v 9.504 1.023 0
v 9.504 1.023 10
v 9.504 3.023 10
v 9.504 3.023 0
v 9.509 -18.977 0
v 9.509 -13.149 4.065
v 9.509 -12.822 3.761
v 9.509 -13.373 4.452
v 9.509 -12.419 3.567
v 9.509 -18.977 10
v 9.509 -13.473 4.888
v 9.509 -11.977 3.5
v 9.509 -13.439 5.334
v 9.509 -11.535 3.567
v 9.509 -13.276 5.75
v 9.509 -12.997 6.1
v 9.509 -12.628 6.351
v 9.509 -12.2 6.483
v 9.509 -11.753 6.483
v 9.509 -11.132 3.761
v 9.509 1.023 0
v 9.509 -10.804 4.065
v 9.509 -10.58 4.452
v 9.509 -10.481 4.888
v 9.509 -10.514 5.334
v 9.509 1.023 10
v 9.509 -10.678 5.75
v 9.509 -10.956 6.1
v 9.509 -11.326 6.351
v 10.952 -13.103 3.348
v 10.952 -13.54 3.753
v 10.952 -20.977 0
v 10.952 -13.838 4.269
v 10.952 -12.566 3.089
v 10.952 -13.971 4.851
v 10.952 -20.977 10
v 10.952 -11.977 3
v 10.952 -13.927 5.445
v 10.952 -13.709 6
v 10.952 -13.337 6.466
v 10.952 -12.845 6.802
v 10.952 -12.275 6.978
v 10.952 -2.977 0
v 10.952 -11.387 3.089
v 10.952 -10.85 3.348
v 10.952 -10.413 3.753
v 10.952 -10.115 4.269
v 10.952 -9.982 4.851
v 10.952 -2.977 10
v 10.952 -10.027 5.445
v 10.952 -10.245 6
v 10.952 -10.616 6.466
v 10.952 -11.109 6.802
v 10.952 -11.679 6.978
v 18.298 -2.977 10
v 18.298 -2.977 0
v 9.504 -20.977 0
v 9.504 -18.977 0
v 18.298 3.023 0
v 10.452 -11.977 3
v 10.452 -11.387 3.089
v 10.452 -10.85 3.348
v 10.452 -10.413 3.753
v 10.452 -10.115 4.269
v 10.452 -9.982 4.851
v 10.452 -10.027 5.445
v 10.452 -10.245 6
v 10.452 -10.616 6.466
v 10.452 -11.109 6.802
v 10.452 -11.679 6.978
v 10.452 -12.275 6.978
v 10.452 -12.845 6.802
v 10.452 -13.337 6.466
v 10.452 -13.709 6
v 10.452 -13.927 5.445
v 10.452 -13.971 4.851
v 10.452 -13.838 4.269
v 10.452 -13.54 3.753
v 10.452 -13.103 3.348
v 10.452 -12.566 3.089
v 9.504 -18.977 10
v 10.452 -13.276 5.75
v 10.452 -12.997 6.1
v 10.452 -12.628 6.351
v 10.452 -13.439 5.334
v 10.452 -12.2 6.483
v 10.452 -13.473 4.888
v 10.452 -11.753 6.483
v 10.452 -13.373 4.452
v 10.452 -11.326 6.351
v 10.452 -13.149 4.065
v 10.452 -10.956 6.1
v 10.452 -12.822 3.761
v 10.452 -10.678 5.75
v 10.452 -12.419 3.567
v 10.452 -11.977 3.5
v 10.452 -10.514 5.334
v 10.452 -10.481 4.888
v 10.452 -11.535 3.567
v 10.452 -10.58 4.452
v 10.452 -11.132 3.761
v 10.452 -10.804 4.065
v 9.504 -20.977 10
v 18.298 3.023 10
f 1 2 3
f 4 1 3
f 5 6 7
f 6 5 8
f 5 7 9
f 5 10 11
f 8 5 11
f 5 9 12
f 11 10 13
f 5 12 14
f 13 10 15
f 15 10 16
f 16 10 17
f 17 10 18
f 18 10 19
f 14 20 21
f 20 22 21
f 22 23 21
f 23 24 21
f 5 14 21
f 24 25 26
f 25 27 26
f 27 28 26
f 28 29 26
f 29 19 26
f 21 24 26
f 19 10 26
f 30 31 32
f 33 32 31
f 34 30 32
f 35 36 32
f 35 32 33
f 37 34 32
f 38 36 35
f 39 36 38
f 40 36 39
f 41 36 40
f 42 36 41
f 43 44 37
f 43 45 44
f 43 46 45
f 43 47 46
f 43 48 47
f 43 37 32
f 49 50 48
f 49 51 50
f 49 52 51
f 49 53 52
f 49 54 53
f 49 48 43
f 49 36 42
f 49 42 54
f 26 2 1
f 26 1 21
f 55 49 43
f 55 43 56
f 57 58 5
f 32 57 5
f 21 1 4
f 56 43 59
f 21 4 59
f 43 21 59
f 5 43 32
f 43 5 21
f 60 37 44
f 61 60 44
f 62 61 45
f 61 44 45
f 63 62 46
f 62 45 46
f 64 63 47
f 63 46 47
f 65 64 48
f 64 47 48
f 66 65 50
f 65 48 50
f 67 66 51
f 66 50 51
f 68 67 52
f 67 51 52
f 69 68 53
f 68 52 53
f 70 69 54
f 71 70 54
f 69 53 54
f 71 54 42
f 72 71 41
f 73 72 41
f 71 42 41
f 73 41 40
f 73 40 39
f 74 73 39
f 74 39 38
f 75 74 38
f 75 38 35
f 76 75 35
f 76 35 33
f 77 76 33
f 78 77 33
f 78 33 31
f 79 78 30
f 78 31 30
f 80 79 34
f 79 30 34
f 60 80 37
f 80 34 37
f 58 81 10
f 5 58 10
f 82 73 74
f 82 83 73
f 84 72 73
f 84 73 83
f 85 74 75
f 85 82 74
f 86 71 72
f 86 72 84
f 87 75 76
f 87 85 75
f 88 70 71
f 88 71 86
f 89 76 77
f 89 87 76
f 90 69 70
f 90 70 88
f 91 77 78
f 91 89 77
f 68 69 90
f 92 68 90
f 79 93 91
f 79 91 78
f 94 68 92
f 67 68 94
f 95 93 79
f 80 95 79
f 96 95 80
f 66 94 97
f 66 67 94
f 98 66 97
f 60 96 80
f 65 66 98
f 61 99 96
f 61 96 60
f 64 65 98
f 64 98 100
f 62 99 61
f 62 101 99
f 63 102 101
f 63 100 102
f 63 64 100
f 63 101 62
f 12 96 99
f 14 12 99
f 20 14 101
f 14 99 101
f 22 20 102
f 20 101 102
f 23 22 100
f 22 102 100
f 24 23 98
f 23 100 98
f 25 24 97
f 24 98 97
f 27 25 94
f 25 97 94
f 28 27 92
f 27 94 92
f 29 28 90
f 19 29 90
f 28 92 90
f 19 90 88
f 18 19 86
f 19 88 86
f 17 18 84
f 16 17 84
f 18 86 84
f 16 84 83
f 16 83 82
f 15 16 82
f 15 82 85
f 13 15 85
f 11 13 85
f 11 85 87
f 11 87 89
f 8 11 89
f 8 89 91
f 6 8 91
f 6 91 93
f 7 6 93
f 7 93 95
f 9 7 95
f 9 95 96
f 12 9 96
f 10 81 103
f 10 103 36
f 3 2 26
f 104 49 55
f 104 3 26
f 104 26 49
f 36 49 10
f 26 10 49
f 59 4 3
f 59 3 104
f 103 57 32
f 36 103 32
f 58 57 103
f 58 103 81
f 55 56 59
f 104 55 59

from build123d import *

# Parameters (mm, degrees)
ESQUISSE1_W             = 30
ESQUISSE1_H             = 24
BOSS_EXTRU_1_DEPTH      = 10
ESQUISSE2_W             = 20
ESQUISSE2_H             = 20
ENL_V_MAT_EXTRU_1_DEPTH = 10
ESQUISSE3_W             = 7.346397708
ESQUISSE3_H             = 18
ENL_V_MAT_EXTRU_2_DEPTH = 10
ESQUISSE5_W             = 21.205400457
ESQUISSE5_H             = 24
ENL_V_MAT_EXTRU_3_DEPTH = 10
ESQUISSE6_R             = 2
ENL_V_MAT_EXTRU_4_DEPTH = 0.5
ESQUISSE7_R             = 1.5
ENL_V_MAT_EXTRU_5_DEPTH = 10.5


with BuildPart() as part:
    # Esquisse1 → Boss.-Extru.1 (new body)
    with BuildSketch(Plane.XY):
        with Locations((3.298240101, -8.976744186)):
            Rectangle(ESQUISSE1_W, ESQUISSE1_H)
    extrude(amount=BOSS_EXTRU_1_DEPTH)

    # Esquisse2 → Enlèv. mat.-Extru.1 (cut)
    with BuildSketch(Plane.XY.offset(10)):
        with Locations((-0.490787108, -8.976744186)):
            Rectangle(ESQUISSE2_W, ESQUISSE2_H)
    extrude(amount=-ENL_V_MAT_EXTRU_1_DEPTH, mode=Mode.SUBTRACT)

    # Esquisse3 → Enlèv. mat.-Extru.2 (cut)
    with BuildSketch(Plane.XY.offset(10)):
        with Locations((14.625041247, -11.976744186)):
            Rectangle(ESQUISSE3_W, ESQUISSE3_H)
    extrude(amount=-ENL_V_MAT_EXTRU_2_DEPTH, mode=Mode.SUBTRACT)

    # Esquisse5 → Enlèv. mat.-Extru.3 (cut)
    with BuildSketch(Plane.XY.offset(10)):
        with Locations((-1.09905967, -8.976744186)):
            Rectangle(ESQUISSE5_W, ESQUISSE5_H)
    extrude(amount=-ENL_V_MAT_EXTRU_3_DEPTH, mode=Mode.SUBTRACT)

    # Esquisse6 → Enlèv. mat.-Extru.4 (cut)
    with BuildSketch(Plane(origin=(10.951842393, 0, 0), x_dir=(0, 0, -1), z_dir=(1, 0, 0))):
        with Locations((-5, -11.976744186)):
            Circle(ESQUISSE6_R)
    extrude(amount=-ENL_V_MAT_EXTRU_4_DEPTH, mode=Mode.SUBTRACT)

    # Esquisse7 → Enlèv. mat.-Extru.5 (cut)
    with BuildSketch(Plane(origin=(10.451842393, 0, 0), x_dir=(0, 0, -1), z_dir=(1, 0, 0))):
        with Locations((-5, -11.976744186)):
            Circle(ESQUISSE7_R)
    extrude(amount=-ENL_V_MAT_EXTRU_5_DEPTH, mode=Mode.SUBTRACT)


solid = part.part
